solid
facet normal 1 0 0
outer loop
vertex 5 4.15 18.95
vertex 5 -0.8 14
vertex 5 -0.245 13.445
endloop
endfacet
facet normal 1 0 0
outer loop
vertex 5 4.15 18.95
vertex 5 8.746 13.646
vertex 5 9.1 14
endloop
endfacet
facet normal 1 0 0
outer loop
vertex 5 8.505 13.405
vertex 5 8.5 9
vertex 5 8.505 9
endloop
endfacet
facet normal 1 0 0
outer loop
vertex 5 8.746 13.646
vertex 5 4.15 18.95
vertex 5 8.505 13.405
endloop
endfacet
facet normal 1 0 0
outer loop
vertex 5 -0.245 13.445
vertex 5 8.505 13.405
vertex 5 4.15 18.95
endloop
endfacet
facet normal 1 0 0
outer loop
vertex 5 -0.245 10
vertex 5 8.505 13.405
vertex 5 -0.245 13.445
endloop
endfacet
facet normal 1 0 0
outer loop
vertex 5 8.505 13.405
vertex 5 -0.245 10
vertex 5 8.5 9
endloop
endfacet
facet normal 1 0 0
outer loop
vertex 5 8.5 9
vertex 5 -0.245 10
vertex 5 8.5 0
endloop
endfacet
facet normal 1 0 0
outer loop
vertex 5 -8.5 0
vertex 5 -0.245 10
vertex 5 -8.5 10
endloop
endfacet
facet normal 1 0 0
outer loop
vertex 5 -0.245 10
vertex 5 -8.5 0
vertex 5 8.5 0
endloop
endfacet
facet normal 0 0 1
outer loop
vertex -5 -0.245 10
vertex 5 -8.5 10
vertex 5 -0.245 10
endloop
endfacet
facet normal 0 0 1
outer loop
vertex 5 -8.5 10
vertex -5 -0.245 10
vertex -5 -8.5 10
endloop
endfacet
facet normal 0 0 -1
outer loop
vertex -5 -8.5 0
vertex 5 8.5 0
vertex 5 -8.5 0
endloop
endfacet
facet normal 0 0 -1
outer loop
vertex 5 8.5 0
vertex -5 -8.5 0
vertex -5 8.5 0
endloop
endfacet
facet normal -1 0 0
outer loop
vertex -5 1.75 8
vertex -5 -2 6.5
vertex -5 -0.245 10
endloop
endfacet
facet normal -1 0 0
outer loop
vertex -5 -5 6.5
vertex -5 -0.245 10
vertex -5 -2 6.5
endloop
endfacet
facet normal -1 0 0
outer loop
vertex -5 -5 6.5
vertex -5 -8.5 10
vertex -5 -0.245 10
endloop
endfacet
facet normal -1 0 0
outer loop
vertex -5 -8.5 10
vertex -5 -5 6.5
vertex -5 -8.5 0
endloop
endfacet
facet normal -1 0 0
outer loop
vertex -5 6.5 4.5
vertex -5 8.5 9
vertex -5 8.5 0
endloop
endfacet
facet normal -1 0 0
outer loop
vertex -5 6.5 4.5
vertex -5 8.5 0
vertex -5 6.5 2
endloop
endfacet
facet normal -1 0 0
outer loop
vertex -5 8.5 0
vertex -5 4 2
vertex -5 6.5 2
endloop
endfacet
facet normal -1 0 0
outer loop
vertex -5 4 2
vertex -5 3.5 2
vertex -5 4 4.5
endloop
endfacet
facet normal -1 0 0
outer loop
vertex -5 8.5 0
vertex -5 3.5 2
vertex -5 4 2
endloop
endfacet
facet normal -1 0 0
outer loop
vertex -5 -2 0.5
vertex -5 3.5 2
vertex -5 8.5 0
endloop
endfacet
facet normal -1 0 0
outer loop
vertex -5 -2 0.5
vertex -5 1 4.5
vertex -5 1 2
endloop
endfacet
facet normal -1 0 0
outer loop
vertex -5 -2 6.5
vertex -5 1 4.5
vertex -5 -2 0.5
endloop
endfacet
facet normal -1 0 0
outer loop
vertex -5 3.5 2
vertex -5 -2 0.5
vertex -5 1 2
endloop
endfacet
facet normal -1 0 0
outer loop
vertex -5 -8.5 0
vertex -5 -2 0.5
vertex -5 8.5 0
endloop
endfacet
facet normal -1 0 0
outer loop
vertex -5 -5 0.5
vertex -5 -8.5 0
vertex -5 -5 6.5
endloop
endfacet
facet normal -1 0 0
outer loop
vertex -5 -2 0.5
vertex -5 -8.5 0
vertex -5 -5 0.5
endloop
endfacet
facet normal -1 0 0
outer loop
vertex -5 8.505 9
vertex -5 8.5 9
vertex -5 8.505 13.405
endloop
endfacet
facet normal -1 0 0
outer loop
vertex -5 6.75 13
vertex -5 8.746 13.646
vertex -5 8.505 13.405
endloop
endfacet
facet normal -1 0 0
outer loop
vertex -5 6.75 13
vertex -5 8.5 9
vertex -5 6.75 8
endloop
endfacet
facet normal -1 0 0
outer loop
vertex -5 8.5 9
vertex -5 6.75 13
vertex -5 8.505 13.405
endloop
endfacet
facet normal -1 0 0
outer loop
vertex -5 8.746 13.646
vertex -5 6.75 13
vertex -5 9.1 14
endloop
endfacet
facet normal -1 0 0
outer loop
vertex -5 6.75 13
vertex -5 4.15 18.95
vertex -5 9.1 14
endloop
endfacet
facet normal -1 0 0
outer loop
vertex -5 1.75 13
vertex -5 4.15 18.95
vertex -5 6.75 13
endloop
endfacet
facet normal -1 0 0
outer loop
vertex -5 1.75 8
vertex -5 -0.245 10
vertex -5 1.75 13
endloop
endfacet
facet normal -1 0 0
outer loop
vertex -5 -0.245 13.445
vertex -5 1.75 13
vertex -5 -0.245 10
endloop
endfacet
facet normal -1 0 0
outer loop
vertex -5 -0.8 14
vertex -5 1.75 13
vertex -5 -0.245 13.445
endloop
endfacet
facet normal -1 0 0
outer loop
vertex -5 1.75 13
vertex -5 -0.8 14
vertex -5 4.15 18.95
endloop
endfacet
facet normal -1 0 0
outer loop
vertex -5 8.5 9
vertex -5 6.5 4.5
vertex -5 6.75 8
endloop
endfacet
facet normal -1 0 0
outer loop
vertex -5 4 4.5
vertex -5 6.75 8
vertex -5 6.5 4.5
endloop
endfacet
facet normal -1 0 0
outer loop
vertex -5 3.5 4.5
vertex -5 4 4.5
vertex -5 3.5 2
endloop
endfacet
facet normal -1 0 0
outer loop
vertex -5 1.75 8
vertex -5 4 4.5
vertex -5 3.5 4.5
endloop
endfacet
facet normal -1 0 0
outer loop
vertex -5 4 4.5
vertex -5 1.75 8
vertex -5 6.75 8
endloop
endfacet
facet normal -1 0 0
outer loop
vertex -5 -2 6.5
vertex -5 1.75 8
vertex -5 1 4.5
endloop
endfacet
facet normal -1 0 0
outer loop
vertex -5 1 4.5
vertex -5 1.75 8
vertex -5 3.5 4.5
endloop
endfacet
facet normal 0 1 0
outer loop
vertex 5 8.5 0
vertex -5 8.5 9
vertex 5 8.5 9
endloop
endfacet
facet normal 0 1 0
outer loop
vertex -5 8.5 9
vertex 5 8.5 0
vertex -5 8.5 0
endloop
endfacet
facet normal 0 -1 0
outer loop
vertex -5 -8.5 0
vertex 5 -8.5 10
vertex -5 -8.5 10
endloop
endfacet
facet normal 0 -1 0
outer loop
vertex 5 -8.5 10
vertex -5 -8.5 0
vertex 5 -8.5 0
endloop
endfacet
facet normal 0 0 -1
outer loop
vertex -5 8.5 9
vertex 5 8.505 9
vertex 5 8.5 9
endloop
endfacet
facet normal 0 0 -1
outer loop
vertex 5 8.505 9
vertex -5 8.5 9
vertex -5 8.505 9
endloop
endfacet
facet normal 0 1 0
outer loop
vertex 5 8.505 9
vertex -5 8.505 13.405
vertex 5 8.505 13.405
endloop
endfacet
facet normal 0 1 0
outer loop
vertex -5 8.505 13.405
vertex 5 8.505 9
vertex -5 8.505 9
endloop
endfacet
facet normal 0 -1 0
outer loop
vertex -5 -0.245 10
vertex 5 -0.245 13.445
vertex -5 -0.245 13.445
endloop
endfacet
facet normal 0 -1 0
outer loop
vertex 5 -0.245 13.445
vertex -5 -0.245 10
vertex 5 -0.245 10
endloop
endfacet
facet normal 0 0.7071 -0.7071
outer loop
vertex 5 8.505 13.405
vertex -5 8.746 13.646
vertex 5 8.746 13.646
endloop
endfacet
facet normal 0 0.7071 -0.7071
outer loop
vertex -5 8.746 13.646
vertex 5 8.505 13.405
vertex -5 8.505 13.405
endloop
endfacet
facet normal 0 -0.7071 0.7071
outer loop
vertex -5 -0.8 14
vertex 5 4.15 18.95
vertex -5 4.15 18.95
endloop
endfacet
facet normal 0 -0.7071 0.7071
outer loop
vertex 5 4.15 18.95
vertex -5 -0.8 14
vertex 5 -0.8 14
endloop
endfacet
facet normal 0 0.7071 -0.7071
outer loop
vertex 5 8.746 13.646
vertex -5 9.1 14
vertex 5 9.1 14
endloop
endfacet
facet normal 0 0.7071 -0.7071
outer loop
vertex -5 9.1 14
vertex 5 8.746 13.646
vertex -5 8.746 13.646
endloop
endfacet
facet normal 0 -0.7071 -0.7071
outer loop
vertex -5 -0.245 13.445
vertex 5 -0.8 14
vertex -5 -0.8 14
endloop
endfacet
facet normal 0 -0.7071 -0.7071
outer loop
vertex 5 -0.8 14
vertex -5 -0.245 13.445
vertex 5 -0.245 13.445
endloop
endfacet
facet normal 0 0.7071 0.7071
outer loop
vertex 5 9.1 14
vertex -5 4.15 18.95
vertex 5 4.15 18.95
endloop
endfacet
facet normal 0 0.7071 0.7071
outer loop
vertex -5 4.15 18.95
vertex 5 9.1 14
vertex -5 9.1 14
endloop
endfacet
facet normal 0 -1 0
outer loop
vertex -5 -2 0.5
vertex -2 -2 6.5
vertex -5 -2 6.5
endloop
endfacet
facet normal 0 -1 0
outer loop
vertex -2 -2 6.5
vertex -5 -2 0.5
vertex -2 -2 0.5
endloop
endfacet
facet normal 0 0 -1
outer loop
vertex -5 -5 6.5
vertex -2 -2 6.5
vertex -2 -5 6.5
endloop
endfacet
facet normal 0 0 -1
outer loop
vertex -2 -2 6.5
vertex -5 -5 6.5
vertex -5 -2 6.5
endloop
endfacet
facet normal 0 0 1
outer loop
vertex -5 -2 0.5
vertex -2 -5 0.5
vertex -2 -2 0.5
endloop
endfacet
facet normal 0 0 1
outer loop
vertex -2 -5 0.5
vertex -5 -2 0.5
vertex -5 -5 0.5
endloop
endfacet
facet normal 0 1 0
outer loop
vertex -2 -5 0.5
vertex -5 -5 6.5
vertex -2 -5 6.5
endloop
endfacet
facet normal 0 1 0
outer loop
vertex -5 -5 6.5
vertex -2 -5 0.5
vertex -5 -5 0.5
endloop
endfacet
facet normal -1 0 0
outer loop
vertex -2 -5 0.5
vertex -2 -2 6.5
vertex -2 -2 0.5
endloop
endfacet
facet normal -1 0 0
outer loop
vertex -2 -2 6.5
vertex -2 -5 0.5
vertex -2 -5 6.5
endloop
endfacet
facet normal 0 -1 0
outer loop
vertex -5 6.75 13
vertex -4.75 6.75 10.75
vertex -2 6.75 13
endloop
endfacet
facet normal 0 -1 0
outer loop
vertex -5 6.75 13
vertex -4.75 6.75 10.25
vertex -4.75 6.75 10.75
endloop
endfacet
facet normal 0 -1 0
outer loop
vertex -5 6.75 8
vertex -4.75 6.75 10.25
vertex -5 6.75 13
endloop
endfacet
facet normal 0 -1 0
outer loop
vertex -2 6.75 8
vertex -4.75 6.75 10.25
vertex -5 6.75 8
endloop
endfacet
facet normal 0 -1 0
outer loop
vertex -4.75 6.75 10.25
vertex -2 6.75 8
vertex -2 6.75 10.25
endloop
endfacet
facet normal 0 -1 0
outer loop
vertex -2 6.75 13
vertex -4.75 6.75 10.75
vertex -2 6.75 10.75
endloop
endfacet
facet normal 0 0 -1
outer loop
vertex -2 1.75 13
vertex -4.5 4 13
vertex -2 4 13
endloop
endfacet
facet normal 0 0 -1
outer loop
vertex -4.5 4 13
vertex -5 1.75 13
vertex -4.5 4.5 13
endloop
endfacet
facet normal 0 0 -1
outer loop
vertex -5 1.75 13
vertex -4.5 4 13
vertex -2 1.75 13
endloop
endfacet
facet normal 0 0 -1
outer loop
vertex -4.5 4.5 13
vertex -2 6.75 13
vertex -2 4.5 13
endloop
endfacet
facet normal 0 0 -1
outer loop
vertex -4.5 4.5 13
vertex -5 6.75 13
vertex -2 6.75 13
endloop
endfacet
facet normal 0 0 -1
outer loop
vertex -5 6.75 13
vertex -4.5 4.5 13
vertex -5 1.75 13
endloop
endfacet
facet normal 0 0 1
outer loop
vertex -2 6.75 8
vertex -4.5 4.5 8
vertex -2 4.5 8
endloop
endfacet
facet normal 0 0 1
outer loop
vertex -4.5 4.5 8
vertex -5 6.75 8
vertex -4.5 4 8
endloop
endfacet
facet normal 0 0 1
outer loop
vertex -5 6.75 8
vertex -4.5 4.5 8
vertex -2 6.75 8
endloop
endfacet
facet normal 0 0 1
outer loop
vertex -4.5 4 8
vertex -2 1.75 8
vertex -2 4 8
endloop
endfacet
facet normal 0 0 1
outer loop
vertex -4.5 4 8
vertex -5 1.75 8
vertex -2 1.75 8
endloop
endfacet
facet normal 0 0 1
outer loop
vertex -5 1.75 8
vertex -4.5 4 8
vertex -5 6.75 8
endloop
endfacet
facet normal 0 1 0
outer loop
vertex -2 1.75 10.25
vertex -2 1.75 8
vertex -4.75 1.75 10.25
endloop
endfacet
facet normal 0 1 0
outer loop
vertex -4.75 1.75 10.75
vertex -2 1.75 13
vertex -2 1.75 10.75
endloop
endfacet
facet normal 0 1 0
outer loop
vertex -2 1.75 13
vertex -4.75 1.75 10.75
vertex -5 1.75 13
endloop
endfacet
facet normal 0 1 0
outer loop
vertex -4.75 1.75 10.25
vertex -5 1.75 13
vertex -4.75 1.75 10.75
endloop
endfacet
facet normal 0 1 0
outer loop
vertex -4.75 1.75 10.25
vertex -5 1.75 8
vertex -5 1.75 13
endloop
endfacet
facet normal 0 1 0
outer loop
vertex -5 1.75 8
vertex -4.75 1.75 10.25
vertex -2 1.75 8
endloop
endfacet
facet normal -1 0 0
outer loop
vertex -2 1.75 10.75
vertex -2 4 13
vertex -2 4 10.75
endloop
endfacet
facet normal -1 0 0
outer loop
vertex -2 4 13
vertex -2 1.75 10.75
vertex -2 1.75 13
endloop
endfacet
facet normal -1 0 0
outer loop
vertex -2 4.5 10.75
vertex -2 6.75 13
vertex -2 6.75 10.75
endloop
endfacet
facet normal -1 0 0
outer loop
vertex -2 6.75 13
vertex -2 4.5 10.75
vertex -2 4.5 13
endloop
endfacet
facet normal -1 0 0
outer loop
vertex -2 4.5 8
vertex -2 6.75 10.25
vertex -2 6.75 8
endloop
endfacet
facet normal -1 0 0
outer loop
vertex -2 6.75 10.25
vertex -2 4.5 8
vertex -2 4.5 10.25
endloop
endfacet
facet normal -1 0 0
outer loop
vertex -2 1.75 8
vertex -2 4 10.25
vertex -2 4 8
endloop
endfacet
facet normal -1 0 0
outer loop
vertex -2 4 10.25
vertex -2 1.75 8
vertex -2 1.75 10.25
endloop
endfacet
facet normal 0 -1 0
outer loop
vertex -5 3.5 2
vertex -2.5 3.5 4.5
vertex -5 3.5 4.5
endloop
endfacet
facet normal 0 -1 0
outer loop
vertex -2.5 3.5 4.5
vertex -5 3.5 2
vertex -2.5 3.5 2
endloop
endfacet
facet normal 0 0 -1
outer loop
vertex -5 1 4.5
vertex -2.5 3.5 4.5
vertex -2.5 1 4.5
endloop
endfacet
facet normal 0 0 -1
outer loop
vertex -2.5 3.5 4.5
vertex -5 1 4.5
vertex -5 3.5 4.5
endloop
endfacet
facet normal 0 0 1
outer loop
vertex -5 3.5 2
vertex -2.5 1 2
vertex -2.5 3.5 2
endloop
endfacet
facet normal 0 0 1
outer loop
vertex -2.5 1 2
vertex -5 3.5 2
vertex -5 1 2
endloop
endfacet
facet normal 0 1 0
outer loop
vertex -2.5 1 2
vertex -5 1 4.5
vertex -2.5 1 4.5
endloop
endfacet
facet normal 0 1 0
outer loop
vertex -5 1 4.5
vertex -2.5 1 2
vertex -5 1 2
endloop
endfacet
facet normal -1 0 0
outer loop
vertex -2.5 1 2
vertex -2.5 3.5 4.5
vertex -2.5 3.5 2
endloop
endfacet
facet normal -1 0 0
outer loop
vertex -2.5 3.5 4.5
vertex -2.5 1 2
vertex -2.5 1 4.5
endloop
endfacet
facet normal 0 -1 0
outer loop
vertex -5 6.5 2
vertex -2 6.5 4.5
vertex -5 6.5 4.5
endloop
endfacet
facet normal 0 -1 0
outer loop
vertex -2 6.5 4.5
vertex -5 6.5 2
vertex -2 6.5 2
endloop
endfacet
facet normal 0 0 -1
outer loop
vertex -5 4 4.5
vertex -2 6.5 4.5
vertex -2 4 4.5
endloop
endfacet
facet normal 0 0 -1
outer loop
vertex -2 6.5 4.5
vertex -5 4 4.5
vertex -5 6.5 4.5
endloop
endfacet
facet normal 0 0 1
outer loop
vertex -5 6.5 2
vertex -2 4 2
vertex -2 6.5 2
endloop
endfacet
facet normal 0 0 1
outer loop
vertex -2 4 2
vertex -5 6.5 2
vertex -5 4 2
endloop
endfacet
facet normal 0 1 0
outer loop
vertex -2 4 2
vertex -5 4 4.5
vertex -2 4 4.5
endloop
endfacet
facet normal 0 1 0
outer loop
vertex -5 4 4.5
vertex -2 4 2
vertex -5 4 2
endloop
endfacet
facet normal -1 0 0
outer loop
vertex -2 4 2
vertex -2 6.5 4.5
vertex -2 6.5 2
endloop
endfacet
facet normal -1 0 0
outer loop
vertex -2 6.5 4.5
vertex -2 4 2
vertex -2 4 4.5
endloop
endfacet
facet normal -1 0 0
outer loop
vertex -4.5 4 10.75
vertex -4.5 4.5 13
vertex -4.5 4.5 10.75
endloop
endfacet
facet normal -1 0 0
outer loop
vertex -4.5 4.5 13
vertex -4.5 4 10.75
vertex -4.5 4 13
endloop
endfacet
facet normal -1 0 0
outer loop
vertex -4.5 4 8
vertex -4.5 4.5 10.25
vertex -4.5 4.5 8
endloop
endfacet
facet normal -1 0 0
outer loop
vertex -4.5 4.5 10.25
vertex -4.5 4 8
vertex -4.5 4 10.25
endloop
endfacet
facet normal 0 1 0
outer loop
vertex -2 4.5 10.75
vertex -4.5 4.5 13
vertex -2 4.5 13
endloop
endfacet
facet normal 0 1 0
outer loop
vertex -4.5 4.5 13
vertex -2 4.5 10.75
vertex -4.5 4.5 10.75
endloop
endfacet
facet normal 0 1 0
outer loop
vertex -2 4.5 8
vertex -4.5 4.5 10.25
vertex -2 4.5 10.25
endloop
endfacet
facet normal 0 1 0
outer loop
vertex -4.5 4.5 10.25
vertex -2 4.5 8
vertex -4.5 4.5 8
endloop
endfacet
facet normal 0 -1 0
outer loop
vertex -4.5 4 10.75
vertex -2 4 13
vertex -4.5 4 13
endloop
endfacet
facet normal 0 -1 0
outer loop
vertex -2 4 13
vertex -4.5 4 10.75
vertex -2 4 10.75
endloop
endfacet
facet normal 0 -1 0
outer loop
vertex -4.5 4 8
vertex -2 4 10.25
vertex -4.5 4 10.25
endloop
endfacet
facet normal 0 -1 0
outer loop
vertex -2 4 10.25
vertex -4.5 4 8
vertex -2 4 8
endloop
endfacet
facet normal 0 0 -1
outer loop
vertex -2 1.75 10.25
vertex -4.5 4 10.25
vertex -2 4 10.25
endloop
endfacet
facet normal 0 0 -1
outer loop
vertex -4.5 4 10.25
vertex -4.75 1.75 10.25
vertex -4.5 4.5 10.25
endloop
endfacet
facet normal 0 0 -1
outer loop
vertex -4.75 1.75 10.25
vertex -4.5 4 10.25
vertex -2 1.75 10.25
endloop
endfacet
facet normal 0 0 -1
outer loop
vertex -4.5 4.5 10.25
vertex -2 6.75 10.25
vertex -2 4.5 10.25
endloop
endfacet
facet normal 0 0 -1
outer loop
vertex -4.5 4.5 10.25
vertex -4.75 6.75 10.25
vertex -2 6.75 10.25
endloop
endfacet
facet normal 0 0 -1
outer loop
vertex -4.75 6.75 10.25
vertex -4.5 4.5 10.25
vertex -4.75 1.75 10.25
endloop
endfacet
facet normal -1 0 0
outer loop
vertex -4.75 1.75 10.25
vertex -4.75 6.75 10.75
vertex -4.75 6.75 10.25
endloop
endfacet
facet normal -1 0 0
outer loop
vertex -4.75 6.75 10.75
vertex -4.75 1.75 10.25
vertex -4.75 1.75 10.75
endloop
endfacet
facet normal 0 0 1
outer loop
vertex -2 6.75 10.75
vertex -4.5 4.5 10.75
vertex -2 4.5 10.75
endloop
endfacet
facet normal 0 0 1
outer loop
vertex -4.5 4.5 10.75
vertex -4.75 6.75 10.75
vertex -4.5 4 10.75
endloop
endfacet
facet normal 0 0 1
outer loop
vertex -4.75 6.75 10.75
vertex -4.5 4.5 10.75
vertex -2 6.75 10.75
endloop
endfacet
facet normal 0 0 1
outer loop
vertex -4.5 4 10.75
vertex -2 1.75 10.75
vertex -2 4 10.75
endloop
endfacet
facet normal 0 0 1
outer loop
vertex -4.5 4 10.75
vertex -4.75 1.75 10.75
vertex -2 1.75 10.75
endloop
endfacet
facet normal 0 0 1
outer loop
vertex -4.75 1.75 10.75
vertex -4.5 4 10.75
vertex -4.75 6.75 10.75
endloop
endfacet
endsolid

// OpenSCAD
difference(){
    translate([0,0,5]){color("orange") cube([10, 17, 10],center=true);
    translate([0,4.13,6.5])color("orange") cube([10, 8.75, 5],center=true);
        
    translate([0,4.15,9])rotate([0,45,90])color("orange") cube([7, 10, 6],center=true);
   translate([0,4.15,9])rotate([0,-45,90])color("orange") cube([7, 10, 7],center=true);
   }
   rotate([0,0,90]){translate([-5,2,.5])cube([3,4,6]);
   translate([1.75,2,8])cube([5,5,5]); 
       translate([1,2.5,2])cube([2.5,5,2.5]);
      translate([4,2,2])cube([2.5,5,2.5]); }}
   translate([-3,4.25,10])color("orange") cube([3, .5, 6],center=true);
   translate([-1.75,4,10.5])rotate([0,90,0])color("orange") cube([.5, 6, 6],center=true);
    
    
